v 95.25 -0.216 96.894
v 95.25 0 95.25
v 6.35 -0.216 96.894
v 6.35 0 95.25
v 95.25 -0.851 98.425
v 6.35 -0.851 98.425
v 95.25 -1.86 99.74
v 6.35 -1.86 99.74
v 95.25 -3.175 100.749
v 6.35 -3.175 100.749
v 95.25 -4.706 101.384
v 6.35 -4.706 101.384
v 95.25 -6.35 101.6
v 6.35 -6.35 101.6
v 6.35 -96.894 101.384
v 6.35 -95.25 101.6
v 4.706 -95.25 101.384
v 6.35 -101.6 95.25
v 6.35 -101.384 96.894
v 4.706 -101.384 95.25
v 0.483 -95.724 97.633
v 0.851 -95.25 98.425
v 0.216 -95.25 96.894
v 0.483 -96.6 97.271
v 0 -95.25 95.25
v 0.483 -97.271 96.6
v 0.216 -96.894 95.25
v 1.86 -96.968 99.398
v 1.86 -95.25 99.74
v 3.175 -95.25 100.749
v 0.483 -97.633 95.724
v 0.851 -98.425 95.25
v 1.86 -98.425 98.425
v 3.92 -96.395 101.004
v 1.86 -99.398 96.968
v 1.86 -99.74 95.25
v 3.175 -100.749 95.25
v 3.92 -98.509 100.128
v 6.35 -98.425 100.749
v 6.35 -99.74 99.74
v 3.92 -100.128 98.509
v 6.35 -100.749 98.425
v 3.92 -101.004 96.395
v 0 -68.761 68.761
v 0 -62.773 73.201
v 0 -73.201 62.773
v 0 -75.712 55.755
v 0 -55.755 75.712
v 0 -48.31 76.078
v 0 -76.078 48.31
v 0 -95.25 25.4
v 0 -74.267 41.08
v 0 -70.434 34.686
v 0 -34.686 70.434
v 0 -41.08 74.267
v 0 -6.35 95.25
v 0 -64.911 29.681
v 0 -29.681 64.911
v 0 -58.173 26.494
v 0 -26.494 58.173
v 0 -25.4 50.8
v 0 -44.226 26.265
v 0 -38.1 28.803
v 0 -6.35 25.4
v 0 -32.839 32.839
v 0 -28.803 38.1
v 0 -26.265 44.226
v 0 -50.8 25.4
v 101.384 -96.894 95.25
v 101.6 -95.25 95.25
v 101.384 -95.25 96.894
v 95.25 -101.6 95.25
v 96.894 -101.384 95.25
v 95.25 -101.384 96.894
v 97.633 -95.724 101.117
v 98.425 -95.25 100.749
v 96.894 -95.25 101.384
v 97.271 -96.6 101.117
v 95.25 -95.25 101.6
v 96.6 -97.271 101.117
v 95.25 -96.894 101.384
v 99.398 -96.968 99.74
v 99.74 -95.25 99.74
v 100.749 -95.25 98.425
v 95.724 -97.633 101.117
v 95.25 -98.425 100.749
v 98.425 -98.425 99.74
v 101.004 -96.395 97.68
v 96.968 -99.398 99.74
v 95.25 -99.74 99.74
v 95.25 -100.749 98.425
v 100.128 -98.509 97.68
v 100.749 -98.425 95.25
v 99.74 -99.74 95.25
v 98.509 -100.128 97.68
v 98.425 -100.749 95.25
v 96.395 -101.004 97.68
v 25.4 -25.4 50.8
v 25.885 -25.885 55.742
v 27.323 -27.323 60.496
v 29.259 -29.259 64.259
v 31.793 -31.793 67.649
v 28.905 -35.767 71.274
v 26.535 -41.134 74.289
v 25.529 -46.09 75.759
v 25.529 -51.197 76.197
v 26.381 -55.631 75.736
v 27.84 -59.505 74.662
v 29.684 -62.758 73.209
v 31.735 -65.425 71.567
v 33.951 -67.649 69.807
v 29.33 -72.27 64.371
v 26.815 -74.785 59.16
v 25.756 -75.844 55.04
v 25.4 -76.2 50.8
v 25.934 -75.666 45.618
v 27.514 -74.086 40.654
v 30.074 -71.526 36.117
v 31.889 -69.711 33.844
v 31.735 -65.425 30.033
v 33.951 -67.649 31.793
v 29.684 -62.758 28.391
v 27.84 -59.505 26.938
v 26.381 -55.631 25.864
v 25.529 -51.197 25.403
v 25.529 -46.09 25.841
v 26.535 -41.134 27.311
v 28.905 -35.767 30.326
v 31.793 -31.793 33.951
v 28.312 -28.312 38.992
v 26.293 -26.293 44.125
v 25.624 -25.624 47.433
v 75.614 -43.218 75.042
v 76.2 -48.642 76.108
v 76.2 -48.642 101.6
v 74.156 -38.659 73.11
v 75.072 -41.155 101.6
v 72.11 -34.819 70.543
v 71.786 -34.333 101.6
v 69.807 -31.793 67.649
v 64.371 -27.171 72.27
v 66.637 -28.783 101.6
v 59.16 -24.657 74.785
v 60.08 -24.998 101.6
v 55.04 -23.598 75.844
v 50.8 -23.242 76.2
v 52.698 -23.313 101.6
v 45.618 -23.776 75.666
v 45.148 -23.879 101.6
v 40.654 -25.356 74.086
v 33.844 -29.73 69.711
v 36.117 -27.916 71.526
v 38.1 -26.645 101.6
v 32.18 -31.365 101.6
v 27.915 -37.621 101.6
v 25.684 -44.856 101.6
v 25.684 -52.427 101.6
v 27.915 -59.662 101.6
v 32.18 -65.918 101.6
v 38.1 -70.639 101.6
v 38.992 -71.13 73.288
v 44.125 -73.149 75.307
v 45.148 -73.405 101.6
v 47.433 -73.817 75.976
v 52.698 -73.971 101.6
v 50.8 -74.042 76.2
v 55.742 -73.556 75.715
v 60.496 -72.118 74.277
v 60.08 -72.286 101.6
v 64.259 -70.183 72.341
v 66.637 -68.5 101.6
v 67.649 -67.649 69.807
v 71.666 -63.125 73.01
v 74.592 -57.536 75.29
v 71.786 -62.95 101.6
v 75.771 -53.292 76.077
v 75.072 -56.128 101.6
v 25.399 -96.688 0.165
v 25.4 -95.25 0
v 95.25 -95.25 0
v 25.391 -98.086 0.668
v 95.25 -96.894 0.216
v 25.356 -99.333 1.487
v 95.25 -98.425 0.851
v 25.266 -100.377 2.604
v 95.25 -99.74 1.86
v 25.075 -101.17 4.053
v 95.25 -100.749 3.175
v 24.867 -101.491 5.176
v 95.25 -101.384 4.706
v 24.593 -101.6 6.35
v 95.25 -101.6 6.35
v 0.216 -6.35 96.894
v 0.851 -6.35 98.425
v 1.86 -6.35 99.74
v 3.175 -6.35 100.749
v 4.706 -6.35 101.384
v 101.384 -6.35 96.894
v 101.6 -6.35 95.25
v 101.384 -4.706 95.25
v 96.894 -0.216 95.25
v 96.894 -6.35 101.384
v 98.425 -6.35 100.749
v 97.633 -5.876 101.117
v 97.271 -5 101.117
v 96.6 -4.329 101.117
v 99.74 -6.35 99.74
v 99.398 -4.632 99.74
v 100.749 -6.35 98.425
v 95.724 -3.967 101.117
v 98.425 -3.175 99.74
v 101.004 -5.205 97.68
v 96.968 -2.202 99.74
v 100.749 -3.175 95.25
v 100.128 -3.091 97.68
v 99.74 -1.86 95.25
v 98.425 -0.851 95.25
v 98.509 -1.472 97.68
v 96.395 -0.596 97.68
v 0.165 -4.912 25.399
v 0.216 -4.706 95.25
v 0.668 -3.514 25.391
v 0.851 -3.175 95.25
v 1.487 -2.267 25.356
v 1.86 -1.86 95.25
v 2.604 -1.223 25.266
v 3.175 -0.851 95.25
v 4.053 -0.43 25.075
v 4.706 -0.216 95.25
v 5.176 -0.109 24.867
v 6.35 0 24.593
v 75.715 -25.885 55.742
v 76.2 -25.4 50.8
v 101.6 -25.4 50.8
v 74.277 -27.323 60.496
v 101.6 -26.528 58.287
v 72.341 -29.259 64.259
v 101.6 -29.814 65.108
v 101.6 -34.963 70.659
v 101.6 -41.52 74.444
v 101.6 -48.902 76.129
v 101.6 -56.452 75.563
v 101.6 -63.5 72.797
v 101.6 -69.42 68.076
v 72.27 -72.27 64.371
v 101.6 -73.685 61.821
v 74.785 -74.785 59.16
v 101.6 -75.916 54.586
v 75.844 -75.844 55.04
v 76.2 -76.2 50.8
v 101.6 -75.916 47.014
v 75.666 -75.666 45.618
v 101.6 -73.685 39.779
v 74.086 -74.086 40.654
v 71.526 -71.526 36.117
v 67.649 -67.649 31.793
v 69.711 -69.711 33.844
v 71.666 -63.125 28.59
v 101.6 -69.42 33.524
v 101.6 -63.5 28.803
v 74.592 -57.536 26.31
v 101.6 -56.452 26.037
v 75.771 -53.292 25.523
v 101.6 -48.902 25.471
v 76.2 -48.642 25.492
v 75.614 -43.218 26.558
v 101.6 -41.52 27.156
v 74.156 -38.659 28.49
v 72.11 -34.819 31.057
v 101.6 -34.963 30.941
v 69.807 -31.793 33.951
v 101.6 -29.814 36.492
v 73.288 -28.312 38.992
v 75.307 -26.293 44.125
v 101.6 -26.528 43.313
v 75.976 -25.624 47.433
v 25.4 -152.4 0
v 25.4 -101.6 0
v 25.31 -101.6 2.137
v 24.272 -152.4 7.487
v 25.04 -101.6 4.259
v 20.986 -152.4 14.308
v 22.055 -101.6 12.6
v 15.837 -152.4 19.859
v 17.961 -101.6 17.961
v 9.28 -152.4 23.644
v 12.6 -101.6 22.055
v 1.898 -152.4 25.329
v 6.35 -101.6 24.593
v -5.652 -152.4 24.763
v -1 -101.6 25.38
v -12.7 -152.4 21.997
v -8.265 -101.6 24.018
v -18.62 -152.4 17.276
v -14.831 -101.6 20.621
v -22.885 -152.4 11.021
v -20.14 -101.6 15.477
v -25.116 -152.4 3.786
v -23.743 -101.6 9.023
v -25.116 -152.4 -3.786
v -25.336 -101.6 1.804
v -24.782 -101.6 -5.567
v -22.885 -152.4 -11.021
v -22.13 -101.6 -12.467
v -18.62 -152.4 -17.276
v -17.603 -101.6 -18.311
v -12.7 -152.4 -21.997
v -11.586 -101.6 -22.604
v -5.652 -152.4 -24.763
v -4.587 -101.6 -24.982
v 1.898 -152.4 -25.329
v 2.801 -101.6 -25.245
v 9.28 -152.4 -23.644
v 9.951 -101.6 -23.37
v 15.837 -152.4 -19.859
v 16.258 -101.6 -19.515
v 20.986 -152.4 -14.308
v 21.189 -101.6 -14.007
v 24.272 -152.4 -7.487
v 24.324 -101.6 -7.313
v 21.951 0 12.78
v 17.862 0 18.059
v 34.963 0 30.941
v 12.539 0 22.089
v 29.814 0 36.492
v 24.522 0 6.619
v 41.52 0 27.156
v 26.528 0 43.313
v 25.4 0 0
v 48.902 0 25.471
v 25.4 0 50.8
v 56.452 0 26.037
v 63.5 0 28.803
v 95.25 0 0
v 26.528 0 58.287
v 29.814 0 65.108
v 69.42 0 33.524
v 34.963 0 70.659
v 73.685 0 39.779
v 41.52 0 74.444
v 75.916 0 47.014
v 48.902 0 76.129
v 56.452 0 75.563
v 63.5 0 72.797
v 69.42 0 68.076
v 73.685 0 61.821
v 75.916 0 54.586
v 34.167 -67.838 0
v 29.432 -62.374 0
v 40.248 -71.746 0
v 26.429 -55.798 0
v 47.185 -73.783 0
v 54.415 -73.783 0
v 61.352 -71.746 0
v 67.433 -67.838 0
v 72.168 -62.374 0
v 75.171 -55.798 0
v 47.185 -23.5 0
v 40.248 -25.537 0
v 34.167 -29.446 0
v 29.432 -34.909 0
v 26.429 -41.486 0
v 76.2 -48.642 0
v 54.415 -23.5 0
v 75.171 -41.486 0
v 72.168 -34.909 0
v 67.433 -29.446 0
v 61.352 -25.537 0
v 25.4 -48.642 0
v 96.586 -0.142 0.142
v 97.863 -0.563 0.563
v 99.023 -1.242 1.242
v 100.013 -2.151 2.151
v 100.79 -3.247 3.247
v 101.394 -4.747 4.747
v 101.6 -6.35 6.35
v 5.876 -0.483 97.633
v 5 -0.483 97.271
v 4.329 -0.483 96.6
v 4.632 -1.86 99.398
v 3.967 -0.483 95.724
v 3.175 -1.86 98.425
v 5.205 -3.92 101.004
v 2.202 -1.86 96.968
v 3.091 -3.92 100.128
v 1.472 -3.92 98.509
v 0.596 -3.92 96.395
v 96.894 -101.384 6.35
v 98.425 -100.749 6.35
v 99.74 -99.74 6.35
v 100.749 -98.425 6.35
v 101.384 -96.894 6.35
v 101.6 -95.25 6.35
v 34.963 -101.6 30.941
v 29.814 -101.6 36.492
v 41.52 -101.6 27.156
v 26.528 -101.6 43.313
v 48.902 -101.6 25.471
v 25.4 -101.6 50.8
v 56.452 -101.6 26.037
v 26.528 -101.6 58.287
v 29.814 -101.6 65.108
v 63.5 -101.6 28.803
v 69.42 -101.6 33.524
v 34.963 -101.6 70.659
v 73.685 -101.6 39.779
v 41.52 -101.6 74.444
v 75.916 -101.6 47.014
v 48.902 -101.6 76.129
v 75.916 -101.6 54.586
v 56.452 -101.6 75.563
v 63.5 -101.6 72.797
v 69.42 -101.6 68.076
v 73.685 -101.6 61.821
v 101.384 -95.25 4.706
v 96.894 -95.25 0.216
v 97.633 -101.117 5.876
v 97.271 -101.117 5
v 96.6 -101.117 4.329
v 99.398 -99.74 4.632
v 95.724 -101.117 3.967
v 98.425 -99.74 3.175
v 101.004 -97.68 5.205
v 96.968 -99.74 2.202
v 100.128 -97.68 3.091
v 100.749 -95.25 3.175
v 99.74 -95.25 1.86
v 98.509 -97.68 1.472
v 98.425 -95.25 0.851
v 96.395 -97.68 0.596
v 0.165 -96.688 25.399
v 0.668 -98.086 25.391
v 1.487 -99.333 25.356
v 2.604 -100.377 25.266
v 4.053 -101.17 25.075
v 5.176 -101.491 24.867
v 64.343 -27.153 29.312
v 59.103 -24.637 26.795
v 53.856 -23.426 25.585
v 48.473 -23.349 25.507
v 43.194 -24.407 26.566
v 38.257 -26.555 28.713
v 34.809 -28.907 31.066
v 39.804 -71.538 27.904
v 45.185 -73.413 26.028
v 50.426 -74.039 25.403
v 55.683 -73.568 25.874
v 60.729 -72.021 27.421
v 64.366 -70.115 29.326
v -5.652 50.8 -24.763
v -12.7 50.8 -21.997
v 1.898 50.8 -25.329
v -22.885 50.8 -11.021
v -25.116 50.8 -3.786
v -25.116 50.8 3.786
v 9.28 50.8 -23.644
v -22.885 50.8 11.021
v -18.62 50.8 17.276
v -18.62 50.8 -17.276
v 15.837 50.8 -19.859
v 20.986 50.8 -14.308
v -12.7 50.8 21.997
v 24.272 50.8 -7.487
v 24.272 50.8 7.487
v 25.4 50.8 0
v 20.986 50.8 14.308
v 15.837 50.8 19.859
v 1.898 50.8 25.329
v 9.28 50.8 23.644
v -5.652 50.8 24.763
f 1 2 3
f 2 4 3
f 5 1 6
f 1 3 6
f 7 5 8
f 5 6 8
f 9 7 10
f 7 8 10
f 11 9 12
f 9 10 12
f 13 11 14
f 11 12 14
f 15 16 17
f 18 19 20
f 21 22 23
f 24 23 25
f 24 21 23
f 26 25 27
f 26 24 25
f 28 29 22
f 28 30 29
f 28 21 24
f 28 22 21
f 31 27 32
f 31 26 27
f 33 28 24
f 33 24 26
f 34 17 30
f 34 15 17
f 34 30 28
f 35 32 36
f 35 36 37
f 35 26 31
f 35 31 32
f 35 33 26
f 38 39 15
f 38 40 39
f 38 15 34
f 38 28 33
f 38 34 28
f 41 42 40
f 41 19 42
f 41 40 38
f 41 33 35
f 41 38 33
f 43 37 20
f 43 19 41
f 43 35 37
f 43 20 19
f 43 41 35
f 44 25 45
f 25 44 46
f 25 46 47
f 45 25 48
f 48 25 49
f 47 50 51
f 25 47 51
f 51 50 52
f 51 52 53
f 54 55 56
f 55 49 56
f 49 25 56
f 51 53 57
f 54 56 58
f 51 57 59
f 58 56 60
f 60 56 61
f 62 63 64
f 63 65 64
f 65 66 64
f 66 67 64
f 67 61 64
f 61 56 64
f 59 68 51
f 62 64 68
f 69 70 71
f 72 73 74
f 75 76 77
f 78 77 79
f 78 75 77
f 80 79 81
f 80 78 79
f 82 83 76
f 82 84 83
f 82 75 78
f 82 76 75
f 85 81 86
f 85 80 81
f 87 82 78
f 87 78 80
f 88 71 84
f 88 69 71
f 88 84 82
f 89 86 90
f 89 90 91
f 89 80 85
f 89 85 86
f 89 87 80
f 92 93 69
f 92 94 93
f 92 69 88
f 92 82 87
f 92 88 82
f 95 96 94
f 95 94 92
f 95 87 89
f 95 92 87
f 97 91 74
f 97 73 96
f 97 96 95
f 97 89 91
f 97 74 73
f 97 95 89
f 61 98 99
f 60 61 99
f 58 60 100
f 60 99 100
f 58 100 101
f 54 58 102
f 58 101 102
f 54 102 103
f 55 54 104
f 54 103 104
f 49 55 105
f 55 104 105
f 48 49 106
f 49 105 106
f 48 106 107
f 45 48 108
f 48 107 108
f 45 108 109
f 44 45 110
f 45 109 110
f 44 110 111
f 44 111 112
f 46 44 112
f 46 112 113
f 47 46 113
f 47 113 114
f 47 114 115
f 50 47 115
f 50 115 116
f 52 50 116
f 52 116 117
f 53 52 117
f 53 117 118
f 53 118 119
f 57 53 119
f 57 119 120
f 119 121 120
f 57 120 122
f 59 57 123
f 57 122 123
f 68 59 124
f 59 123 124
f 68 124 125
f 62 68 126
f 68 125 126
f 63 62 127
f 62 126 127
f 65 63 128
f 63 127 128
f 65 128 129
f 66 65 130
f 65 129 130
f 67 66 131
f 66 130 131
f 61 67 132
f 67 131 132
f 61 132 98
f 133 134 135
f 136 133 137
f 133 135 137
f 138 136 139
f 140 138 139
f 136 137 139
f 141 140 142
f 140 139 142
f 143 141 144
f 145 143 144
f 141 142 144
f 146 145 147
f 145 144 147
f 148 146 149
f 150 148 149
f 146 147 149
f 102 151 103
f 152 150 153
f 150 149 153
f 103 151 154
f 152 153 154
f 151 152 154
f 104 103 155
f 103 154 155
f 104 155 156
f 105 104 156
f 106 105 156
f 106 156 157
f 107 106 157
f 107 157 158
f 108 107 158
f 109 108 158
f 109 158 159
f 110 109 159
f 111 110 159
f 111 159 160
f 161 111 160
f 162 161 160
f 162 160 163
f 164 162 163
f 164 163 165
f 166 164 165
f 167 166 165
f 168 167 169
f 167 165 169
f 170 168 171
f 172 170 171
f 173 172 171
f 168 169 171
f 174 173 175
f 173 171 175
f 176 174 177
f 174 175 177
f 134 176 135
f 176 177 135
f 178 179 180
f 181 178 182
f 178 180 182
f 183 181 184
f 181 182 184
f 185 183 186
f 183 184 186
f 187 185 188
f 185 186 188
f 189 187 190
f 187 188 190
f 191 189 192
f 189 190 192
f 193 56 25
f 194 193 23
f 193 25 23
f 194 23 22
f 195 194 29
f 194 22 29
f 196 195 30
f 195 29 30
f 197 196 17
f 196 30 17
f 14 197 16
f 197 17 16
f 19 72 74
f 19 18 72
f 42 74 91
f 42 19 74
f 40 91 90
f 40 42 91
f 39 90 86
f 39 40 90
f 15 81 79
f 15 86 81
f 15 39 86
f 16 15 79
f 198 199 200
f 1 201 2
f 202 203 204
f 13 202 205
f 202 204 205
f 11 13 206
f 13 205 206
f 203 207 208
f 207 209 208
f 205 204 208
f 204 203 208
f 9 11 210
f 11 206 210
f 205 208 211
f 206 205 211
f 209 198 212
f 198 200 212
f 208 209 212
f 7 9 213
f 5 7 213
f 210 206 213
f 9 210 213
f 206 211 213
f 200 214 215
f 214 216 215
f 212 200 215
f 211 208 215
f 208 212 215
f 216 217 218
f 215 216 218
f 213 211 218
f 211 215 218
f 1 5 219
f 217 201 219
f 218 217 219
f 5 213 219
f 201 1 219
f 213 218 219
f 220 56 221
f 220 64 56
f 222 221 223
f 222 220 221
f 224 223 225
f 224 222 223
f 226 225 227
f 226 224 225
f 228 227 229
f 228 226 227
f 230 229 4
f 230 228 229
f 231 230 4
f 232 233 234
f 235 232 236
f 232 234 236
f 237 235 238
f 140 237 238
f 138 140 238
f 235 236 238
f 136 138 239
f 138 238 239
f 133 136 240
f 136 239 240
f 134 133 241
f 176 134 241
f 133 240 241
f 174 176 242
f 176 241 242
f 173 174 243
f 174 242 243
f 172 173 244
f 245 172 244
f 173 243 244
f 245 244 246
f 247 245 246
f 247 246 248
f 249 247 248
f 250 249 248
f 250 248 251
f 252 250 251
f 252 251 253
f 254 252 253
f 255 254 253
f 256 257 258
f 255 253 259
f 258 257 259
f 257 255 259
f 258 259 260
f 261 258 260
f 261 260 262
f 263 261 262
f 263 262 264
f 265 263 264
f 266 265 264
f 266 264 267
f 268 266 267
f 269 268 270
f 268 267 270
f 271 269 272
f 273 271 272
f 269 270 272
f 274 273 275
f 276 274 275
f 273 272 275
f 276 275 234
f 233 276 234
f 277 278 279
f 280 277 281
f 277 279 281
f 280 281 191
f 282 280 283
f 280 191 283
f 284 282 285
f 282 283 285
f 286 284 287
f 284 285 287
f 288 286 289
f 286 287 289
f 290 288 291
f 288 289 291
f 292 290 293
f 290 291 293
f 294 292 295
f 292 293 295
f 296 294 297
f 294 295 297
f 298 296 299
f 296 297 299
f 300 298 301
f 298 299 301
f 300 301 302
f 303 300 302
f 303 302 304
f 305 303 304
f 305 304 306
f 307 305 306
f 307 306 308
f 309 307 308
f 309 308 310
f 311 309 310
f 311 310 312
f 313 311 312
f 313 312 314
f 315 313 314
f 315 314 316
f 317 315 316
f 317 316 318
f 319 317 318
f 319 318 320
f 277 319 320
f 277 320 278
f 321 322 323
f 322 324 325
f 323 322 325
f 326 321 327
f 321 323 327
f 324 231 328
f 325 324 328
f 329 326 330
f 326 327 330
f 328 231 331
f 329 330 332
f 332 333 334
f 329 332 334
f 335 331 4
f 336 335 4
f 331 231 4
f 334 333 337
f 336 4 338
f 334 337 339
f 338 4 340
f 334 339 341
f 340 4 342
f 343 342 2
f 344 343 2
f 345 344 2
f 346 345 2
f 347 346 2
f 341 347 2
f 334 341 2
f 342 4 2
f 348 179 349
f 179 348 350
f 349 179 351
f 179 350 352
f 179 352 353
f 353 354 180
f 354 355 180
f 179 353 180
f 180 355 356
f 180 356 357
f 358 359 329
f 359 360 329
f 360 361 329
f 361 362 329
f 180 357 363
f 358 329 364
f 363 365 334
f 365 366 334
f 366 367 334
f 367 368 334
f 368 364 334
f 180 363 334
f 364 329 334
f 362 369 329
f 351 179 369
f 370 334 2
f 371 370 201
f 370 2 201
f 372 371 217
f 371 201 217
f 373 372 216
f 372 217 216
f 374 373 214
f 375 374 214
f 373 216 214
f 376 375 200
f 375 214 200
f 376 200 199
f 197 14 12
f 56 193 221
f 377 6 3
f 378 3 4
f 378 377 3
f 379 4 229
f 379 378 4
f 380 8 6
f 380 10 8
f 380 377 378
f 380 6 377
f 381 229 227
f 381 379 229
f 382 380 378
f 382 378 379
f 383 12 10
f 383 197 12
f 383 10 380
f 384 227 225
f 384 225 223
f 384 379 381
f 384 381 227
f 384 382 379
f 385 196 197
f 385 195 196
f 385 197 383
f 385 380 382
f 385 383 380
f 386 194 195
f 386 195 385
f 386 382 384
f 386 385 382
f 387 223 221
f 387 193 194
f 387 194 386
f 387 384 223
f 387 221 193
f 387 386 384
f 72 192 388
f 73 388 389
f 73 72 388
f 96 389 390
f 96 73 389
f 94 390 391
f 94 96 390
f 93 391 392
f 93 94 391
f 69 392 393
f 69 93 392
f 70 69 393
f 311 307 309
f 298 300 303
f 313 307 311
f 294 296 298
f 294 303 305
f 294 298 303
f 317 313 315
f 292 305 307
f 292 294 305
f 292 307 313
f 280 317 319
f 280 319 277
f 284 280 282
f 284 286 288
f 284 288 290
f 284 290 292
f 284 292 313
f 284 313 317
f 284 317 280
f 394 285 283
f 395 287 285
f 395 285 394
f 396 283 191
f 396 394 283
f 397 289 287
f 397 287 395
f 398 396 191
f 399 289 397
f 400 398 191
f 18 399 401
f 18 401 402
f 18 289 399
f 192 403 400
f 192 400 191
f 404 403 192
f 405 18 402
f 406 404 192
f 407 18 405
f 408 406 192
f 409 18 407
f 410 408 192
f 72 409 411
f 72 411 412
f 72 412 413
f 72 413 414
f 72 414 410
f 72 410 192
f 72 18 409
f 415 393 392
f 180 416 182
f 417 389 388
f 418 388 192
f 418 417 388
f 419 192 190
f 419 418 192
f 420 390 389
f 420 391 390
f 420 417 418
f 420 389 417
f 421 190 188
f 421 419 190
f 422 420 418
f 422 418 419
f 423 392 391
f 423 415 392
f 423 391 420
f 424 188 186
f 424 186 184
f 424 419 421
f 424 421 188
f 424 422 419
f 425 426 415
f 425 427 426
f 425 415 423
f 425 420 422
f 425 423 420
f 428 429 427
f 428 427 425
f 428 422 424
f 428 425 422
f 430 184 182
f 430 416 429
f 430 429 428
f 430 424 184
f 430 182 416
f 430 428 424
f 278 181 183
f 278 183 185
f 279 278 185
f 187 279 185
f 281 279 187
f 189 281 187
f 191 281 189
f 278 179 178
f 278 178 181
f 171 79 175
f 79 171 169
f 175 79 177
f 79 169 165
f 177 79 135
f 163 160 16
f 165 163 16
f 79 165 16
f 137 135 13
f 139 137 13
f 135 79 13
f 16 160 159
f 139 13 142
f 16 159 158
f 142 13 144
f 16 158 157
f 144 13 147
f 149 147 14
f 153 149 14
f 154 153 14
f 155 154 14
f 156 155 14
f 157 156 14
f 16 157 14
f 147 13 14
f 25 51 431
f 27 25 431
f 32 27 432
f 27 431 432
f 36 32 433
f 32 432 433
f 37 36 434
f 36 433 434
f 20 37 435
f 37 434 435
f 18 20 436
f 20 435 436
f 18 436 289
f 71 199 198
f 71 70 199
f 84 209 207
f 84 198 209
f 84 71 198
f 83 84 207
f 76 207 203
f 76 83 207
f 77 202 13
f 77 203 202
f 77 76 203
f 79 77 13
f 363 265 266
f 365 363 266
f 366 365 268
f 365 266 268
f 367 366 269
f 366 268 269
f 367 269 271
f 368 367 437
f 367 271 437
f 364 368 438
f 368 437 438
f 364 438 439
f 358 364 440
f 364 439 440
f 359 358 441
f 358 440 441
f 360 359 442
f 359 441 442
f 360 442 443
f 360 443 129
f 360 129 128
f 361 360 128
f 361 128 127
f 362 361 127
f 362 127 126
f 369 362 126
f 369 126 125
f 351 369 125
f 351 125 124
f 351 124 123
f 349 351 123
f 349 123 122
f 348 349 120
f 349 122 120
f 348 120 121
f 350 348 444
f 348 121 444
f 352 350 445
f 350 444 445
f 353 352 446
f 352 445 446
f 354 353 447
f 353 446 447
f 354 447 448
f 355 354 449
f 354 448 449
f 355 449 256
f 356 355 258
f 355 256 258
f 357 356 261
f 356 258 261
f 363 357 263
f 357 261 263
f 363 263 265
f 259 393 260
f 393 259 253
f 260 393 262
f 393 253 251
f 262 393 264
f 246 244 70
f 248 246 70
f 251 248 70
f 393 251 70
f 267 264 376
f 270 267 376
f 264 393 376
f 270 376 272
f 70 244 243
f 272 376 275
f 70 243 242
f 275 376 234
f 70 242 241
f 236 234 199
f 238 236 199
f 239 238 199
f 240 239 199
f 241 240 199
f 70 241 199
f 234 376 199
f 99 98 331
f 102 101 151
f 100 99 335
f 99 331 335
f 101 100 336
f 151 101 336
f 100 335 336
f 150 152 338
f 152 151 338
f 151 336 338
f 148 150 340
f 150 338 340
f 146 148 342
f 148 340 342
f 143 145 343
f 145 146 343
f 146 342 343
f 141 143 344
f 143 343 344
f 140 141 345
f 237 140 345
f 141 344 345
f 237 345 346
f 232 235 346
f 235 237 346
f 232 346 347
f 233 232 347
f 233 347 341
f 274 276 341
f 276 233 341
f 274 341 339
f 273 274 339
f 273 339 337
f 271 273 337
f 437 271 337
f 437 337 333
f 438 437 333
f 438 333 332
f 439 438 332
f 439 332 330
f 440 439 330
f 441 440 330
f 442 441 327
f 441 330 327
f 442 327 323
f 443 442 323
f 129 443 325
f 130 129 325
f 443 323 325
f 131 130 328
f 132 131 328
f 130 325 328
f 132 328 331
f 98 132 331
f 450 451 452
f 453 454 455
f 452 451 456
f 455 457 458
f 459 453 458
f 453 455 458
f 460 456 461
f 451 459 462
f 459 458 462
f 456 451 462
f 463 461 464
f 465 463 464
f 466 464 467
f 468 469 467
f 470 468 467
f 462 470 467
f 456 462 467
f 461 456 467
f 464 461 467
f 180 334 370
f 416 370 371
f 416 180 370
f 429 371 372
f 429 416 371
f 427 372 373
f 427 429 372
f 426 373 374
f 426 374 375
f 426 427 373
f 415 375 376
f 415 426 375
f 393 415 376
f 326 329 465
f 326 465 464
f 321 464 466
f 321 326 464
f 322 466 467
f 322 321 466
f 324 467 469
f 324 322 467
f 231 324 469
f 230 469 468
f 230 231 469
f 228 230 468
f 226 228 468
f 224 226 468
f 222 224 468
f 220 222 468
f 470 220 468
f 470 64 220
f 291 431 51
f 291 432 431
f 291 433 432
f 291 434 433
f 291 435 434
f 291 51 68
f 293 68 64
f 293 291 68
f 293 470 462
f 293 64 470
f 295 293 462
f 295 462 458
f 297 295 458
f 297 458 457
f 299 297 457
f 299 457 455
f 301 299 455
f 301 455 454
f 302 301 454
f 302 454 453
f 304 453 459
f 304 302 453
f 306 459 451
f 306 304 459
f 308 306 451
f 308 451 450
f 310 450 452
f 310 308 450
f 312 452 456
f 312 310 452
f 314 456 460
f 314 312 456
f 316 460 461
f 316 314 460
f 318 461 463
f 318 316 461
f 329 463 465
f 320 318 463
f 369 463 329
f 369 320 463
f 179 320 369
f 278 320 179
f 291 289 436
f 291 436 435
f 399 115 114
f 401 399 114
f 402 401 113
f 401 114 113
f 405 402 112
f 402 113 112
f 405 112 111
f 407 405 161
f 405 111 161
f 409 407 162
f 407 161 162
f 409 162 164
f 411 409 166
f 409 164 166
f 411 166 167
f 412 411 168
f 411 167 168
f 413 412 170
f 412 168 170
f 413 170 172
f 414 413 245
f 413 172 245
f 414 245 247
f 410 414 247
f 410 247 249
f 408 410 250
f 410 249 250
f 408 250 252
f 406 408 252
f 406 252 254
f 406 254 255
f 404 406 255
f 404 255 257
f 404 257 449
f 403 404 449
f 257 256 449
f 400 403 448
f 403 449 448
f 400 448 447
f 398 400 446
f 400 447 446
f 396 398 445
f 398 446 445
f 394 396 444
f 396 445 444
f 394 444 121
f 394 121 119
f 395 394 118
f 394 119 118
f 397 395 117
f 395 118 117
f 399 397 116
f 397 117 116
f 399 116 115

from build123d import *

# Parameters (mm, degrees)
F1_DEPTH       = 101.6
F2_R           = 25.4
F4_DEPTH       = 101.6
F3_R           = 25.4
F5_DEPTH       = 101.6
F6_R           = 25.4
F7_DEPTH       = 101.6
F8_R           = 6.35
F10_R          = 25.4
F11_DEPTH      = 50.8
F11_DEPTH_BACK = 152.4


with BuildPart() as f1:
    # F0 (on Front) → F1 (new body)
    with BuildSketch(Plane.XZ):
        Polygon((0, 3.0090576449), (0, 0), (101.6, 0), (101.6, 101.6), (0, 101.6), align=None)
    extrude(amount=F1_DEPTH)

    # F2 (on face) → F4 (cut)
    with BuildSketch(Plane.XY.offset(101.6)):
        with Locations((50.8, -48.6417040229)):
            Circle(F2_R)
    extrude(amount=-F4_DEPTH, mode=Mode.SUBTRACT)

    # F3 (on face) → F5 (cut)
    with BuildSketch(Plane.YZ.offset(101.6)):
        with Locations((-50.8, 50.8)):
            Circle(F3_R)
    extrude(amount=-F5_DEPTH, mode=Mode.SUBTRACT)

    # F6 (on face) → F7 (cut)
    with BuildSketch(Plane(origin=(0, 0, 0), x_dir=(-1, 0, 0), z_dir=(0, 1, 0))):
        with Locations((-50.8, 50.8)):
            Circle(F6_R)
    extrude(amount=-F7_DEPTH, mode=Mode.SUBTRACT)

    # F8
    f8_edges = [f1.edges().sort_by_distance(p)[0] for p in [
        (101.6, -50.8, 0),
        (101.6, -101.6, 50.8),
        (101.6, 0, 50.8),
        (101.6, -50.8, 101.6),
        (50.8, -101.6, 101.6),
        (0, -50.8, 101.6),
        (50.8, 0, 101.6),
        (50.8, -101.6, 0),
        (0, -101.6, 50.8),
        (0, -50.8, 0),
        (0, 0, 50.8),
    ]]
    fillet(f8_edges, radius=F8_R)

    # F10 (on offset) → F11 (join, two sides)
    with BuildSketch(Plane.XZ.offset(101.6)) as f11_sk:
        Circle(F10_R)
    extrude(amount=F11_DEPTH)
    extrude(f11_sk.sketch, amount=-F11_DEPTH_BACK)


solid = f1.part
